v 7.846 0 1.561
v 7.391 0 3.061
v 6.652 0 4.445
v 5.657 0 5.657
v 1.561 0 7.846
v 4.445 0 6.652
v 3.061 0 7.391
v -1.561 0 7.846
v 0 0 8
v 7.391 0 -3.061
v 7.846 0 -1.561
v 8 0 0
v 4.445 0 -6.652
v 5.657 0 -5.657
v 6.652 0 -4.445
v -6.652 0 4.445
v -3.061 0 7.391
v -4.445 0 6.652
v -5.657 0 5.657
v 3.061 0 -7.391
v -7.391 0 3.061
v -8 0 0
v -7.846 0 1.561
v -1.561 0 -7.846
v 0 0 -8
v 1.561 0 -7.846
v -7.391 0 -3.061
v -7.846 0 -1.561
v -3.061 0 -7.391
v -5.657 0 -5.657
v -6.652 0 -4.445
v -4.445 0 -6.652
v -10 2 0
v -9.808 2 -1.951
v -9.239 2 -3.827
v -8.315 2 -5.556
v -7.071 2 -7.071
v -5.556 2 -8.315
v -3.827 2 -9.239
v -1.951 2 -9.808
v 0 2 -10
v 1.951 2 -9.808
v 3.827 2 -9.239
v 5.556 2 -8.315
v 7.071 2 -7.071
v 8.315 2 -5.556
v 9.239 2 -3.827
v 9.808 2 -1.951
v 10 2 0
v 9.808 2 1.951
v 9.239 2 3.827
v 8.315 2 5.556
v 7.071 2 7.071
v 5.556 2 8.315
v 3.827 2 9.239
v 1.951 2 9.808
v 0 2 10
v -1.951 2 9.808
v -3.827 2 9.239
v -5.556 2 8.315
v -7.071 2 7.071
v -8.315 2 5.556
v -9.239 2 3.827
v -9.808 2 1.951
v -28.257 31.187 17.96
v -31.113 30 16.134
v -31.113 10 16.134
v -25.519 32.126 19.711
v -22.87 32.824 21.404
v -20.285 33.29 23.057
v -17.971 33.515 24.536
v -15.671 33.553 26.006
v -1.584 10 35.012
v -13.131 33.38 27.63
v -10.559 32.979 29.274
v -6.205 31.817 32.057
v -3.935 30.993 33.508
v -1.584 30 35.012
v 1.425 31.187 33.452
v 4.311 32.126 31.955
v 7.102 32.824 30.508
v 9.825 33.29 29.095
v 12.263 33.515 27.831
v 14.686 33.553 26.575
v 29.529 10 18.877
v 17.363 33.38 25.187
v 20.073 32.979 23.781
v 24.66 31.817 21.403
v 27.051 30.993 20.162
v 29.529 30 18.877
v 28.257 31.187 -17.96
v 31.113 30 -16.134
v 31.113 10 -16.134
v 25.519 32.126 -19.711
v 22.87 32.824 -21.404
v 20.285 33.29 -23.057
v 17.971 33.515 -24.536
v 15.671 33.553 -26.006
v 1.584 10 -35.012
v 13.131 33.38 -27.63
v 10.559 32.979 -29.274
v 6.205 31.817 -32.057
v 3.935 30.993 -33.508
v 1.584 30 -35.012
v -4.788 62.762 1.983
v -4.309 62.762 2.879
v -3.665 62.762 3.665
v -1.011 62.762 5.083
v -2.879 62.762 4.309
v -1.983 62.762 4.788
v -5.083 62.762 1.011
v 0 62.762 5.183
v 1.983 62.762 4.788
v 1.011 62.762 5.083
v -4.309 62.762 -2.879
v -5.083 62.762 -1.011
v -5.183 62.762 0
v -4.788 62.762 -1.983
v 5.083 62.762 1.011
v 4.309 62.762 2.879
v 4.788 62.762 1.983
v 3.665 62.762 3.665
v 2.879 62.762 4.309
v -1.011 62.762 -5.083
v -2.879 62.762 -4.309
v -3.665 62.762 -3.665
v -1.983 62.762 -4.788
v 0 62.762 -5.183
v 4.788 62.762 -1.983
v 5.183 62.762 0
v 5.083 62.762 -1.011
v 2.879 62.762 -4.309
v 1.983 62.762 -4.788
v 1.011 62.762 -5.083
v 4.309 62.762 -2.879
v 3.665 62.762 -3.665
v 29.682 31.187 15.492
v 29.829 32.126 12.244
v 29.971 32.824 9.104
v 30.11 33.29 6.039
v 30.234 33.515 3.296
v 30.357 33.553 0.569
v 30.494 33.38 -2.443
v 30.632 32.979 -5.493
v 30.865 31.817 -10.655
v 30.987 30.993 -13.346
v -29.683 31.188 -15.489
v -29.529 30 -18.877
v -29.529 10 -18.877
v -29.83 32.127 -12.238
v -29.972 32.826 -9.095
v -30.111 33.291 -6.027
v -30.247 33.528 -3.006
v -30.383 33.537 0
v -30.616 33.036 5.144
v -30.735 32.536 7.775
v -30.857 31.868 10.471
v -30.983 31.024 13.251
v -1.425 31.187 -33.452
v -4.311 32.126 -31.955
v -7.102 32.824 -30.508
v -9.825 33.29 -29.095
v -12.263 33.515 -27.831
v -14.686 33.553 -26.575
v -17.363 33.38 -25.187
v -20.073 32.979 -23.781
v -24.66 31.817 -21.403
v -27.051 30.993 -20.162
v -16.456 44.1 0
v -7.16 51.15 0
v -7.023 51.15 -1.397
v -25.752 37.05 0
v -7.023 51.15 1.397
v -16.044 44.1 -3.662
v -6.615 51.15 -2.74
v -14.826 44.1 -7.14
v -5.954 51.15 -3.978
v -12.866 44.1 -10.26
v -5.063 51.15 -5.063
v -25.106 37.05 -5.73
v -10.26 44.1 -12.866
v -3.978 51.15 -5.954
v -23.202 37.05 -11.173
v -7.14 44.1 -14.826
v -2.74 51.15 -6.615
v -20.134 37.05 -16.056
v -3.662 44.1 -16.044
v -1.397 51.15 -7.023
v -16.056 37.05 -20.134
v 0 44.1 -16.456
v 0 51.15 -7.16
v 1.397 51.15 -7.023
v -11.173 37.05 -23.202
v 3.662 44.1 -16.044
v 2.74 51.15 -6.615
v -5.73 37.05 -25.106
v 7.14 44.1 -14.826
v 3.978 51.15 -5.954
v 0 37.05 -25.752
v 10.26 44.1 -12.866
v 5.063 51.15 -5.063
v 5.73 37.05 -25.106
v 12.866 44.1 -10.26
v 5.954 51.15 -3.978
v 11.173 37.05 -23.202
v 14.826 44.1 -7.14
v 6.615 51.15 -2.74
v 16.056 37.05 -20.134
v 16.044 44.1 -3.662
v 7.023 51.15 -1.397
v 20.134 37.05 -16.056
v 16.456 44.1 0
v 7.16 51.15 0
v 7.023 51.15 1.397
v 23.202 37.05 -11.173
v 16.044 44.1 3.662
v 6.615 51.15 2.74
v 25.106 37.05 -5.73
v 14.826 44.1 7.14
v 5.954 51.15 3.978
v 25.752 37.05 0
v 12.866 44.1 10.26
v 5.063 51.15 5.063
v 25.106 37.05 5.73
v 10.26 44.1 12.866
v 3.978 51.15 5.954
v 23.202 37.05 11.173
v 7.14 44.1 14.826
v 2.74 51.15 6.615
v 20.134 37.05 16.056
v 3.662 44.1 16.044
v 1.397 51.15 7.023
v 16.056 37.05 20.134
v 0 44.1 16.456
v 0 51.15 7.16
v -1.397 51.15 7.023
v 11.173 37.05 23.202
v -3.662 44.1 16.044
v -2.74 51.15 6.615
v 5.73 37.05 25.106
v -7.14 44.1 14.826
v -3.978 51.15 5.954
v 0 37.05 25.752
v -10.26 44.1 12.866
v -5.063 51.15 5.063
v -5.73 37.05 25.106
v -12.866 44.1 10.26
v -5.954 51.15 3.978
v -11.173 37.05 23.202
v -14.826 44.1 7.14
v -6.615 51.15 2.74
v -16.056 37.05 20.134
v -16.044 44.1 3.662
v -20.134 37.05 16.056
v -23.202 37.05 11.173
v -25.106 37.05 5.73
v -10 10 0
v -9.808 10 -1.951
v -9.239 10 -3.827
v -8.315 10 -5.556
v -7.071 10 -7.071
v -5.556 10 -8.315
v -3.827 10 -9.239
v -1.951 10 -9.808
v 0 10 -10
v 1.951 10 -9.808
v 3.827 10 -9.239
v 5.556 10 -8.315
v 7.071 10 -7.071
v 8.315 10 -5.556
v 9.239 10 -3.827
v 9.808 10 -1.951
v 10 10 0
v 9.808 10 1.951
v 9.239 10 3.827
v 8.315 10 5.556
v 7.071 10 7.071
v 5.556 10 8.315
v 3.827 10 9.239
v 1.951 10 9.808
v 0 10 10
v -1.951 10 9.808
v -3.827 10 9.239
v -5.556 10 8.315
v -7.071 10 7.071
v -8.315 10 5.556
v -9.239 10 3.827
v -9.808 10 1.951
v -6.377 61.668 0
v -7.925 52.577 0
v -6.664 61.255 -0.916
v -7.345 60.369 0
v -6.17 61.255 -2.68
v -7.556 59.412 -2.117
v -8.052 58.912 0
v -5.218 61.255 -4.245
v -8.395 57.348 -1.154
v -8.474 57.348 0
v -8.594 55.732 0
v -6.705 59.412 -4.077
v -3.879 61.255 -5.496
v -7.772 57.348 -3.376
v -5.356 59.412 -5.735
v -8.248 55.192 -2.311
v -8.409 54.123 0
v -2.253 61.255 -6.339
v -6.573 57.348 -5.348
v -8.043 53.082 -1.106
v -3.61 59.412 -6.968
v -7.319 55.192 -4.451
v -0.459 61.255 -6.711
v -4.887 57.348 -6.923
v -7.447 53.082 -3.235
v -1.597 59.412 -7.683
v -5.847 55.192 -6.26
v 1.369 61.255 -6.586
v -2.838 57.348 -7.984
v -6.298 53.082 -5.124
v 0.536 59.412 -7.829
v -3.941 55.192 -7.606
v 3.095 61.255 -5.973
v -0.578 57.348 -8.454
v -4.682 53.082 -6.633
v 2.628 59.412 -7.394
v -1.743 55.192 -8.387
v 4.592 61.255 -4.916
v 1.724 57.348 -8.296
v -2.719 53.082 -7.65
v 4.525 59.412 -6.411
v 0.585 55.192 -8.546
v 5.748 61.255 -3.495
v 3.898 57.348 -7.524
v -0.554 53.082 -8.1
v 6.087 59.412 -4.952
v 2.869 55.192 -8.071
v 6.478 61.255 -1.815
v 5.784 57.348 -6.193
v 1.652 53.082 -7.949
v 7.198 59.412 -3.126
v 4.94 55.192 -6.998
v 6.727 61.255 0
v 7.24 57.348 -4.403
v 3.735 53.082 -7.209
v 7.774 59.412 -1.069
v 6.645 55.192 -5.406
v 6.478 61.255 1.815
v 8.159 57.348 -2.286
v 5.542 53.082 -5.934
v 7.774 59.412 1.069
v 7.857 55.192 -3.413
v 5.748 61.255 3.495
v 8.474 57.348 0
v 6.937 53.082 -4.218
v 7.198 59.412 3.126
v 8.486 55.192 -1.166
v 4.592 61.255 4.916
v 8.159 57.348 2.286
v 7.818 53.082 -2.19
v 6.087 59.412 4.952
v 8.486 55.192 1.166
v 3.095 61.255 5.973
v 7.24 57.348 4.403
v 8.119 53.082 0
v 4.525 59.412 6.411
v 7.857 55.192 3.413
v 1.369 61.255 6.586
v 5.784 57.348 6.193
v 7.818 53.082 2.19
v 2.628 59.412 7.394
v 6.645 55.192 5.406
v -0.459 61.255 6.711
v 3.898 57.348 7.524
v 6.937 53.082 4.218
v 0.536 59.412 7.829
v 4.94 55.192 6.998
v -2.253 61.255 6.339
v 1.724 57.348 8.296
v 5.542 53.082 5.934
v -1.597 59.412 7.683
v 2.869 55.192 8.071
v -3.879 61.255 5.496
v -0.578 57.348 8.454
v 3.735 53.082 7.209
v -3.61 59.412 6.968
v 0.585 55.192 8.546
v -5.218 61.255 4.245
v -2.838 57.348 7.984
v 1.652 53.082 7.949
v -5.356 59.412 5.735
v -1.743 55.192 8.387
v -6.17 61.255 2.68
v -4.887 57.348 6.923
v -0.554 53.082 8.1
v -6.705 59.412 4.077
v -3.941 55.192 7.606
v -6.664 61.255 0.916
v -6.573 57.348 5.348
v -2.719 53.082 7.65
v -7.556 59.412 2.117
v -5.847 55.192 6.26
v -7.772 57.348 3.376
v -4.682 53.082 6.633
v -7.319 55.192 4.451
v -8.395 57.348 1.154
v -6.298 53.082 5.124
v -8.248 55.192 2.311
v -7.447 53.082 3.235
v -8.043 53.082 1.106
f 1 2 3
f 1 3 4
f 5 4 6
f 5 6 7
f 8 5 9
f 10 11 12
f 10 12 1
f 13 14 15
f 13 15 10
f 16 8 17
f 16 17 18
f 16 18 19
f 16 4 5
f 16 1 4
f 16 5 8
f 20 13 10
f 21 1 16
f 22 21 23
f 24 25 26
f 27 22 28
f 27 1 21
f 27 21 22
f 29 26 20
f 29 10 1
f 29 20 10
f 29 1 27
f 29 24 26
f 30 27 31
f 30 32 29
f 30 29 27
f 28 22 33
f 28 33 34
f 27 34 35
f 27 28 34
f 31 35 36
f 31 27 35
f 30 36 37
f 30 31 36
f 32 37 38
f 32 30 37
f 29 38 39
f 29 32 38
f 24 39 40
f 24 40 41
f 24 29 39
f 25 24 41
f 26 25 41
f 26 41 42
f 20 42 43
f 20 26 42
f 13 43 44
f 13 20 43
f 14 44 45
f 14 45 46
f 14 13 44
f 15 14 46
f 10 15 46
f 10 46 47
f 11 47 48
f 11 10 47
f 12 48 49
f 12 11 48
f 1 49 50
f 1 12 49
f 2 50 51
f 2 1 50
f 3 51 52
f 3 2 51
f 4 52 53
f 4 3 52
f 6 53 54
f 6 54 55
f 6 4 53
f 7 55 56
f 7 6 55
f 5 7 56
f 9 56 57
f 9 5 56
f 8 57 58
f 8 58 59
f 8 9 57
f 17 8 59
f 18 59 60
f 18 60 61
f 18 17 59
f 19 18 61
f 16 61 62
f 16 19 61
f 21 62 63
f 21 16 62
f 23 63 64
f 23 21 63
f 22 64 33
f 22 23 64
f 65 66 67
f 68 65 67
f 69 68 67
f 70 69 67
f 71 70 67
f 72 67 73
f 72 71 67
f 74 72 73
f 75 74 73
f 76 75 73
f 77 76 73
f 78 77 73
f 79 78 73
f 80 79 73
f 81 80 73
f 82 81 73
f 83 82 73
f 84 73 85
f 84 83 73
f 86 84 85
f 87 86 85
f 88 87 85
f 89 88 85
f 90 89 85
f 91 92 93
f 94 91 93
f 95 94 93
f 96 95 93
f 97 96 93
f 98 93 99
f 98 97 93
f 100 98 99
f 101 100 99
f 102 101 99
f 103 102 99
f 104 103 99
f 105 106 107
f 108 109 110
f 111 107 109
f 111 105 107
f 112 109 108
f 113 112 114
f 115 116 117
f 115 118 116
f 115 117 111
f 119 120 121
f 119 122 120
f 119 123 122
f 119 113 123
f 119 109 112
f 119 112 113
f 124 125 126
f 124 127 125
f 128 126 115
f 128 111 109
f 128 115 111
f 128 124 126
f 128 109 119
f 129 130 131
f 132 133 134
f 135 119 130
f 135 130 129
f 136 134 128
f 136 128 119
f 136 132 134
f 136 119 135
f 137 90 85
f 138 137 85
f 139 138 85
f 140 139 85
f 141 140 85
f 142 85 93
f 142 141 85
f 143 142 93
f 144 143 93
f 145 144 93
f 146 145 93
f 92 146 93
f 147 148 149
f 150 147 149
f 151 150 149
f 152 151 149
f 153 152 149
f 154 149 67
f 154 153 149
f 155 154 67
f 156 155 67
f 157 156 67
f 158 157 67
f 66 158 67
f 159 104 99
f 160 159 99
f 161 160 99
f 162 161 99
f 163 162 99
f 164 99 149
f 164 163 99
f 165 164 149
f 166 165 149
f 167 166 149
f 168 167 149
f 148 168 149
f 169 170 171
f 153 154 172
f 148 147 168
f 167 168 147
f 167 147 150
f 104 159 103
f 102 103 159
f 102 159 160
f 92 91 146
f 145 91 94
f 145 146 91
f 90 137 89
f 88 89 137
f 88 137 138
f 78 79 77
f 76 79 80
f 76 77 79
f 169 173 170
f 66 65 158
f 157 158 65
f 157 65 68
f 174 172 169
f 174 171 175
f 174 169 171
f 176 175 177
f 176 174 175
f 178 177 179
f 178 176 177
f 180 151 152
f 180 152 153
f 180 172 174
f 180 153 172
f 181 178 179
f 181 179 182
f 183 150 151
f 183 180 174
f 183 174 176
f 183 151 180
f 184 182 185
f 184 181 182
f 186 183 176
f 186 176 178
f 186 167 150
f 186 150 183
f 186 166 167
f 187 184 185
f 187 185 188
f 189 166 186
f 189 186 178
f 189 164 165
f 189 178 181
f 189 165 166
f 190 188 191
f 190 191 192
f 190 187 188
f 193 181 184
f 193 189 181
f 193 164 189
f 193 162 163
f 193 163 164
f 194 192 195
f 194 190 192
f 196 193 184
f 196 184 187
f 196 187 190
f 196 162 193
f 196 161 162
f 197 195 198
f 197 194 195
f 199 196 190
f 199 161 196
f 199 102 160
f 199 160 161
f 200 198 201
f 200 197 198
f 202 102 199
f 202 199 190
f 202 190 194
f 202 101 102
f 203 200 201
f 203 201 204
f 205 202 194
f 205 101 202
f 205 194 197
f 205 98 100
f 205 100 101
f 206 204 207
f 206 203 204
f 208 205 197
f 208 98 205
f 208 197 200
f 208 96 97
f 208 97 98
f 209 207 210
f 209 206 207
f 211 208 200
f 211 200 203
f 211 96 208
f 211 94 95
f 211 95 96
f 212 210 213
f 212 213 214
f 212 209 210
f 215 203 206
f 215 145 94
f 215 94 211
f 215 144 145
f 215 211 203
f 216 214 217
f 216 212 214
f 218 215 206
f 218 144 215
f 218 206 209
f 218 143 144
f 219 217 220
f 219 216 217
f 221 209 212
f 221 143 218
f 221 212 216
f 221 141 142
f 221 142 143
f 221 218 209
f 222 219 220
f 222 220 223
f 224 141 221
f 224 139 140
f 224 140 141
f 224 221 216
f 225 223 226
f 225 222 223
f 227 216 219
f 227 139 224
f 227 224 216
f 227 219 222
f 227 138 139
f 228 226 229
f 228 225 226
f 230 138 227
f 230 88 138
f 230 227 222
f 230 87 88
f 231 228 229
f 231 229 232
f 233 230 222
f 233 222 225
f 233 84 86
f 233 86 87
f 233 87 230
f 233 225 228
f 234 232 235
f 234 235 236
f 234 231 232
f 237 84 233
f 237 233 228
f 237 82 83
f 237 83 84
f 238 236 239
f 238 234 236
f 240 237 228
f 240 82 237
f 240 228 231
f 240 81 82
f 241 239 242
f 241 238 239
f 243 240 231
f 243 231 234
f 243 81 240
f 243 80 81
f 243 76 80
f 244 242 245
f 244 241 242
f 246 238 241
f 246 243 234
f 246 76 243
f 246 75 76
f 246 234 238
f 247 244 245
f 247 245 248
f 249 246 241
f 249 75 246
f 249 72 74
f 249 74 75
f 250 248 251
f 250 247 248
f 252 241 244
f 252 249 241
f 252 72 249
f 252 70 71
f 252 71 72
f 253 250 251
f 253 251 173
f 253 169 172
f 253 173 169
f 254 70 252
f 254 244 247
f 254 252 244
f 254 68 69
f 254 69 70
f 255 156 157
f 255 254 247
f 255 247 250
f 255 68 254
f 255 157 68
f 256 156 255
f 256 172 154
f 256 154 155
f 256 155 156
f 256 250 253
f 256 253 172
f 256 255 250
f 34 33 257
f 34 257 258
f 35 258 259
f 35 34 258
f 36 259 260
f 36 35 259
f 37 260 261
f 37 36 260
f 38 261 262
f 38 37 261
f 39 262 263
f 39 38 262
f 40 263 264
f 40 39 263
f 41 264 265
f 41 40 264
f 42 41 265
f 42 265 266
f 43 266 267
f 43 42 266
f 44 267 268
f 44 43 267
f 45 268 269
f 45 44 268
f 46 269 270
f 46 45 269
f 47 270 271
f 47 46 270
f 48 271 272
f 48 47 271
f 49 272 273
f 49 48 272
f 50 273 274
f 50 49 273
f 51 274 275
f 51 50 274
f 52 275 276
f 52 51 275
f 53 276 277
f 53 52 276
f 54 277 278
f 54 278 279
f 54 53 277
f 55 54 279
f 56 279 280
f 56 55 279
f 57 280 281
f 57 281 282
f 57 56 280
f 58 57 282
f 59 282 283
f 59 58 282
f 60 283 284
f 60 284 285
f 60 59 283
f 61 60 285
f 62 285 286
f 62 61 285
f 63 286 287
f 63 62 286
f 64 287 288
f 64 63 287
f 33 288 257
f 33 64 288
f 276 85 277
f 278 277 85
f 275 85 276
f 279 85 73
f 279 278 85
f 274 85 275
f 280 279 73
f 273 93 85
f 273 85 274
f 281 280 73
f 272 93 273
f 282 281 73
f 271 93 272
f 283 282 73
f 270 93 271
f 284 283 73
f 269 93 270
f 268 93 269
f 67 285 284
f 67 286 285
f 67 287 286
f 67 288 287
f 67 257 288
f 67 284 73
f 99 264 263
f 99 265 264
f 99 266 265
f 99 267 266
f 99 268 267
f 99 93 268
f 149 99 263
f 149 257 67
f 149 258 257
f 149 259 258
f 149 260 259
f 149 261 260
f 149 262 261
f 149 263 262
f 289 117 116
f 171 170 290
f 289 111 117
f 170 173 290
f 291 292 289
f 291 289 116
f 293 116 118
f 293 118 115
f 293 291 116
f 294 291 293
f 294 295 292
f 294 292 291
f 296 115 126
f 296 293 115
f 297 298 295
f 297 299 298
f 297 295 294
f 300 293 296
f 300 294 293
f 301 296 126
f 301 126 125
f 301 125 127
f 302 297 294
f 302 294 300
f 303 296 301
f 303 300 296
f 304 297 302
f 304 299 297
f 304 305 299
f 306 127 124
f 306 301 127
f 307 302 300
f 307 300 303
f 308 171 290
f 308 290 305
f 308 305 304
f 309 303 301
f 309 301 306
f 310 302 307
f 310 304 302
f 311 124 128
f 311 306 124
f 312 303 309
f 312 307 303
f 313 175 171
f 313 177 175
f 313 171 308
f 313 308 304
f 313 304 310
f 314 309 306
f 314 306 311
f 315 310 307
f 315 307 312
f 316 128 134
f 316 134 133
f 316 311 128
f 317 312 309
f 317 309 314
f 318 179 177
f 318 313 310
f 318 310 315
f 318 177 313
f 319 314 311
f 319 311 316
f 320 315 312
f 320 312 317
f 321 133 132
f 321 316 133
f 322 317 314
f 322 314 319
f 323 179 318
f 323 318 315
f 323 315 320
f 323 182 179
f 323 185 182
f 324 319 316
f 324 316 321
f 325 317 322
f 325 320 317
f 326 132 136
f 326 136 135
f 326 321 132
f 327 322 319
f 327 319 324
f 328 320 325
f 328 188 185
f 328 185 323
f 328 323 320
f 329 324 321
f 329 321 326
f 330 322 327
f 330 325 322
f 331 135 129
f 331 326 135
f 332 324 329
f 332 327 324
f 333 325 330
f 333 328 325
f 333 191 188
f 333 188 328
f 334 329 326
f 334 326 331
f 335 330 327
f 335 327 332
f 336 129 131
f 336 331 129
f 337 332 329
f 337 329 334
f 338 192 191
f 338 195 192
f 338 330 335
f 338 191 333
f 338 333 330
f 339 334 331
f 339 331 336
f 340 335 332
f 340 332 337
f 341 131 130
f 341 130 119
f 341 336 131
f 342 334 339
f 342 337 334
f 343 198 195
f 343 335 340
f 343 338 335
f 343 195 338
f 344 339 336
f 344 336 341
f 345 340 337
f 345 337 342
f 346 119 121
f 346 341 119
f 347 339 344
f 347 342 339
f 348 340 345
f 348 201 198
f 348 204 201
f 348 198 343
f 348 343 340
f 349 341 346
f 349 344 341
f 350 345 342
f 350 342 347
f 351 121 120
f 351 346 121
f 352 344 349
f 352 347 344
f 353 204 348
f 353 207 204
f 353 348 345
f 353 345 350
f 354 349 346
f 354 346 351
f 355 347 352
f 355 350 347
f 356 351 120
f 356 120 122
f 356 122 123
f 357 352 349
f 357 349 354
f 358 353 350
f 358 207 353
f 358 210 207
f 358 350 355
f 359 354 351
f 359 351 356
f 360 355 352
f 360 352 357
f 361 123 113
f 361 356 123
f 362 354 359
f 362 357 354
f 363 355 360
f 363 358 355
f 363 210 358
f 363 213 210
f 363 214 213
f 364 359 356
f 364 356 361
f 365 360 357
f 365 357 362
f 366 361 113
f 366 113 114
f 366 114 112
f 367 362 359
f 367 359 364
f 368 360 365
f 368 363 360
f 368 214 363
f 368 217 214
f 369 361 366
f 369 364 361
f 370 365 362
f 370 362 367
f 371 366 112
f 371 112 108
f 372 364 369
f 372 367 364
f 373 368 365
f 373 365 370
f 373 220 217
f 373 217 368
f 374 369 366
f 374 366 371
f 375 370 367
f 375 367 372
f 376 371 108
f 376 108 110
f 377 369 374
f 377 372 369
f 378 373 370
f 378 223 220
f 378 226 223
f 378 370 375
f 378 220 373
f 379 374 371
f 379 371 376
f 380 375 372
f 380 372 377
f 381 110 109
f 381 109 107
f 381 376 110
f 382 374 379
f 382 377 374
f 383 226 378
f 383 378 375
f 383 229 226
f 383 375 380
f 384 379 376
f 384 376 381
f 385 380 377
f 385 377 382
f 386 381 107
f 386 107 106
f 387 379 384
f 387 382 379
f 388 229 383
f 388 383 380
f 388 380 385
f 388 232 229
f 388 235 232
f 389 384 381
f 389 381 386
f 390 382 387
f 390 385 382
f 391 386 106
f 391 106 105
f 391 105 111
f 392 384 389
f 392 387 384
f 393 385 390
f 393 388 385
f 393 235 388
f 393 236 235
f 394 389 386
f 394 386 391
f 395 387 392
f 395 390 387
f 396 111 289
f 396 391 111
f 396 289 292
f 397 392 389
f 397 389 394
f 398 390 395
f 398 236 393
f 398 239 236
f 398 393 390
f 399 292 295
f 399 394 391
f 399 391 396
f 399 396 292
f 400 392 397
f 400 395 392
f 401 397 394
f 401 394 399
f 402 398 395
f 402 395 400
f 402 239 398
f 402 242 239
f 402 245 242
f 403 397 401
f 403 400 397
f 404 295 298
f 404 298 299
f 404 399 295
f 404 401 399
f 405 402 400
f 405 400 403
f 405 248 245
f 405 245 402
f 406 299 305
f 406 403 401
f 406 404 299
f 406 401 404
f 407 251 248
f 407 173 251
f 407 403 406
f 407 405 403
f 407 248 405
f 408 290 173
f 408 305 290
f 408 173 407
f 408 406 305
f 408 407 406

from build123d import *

# Parameters (mm, degrees)
SKETCH2_OUTSIDE_W  = 95.562
SKETCH2_OUTSIDE_H  = 95.562
CUT_EXTRUDE1_DEPTH = 80.973294862
CHAMFER1_SIZE      = 2


with BuildPart() as part:
    # Sketch1 → Revolve1 (revolve)
    with BuildSketch(Plane.XY):
        with BuildLine():
            Line((-7.160370484, 51.149500409), (-35.047619048, 30))
            Line((-35.047619048, 30), (-35.047619048, 10))
            Line((-35.047619048, 10), (-10, 10))
            Line((-10, 10), (-10, 0))
            Line((-10, 0), (0, 0))
            Line((0, 0), (0, 62.761904762))
            Line((0, 62.761904762), (-5.182953714, 62.761904762))
            ThreePointArc((-5.182953714, 62.761904762), (-8.473570486, 57.347682757), (-7.160370484, 51.149500409))
        make_face()
    revolve(axis=Axis((0, 62.761904762, 0), (0, -1, 0)))

    # Sketch2 outside → Cut-Extrude1 (cut, through all)
    with BuildSketch(Plane(origin=(0, 62.761904762, 0), x_dir=(1, 0, 0), z_dir=(0, 1, 0))):
        Rectangle(SKETCH2_OUTSIDE_W, SKETCH2_OUTSIDE_H)
        Polygon((-31.112953649, -16.134426428), (-1.583653662, -35.011821461), (29.529299986, -18.877395033), (31.112953649, 16.134426428), (1.583653662, 35.011821461), (-29.529299986, 18.877395033), align=None, mode=Mode.SUBTRACT)
    extrude(amount=-CUT_EXTRUDE1_DEPTH, mode=Mode.SUBTRACT)

    # Chamfer1
    chamfer1_edges = [part.edges().sort_by_distance(p)[0] for p in [
        (10, 0, 0),
    ]]
    chamfer(chamfer1_edges, length=CHAMFER1_SIZE)


solid = part.part
